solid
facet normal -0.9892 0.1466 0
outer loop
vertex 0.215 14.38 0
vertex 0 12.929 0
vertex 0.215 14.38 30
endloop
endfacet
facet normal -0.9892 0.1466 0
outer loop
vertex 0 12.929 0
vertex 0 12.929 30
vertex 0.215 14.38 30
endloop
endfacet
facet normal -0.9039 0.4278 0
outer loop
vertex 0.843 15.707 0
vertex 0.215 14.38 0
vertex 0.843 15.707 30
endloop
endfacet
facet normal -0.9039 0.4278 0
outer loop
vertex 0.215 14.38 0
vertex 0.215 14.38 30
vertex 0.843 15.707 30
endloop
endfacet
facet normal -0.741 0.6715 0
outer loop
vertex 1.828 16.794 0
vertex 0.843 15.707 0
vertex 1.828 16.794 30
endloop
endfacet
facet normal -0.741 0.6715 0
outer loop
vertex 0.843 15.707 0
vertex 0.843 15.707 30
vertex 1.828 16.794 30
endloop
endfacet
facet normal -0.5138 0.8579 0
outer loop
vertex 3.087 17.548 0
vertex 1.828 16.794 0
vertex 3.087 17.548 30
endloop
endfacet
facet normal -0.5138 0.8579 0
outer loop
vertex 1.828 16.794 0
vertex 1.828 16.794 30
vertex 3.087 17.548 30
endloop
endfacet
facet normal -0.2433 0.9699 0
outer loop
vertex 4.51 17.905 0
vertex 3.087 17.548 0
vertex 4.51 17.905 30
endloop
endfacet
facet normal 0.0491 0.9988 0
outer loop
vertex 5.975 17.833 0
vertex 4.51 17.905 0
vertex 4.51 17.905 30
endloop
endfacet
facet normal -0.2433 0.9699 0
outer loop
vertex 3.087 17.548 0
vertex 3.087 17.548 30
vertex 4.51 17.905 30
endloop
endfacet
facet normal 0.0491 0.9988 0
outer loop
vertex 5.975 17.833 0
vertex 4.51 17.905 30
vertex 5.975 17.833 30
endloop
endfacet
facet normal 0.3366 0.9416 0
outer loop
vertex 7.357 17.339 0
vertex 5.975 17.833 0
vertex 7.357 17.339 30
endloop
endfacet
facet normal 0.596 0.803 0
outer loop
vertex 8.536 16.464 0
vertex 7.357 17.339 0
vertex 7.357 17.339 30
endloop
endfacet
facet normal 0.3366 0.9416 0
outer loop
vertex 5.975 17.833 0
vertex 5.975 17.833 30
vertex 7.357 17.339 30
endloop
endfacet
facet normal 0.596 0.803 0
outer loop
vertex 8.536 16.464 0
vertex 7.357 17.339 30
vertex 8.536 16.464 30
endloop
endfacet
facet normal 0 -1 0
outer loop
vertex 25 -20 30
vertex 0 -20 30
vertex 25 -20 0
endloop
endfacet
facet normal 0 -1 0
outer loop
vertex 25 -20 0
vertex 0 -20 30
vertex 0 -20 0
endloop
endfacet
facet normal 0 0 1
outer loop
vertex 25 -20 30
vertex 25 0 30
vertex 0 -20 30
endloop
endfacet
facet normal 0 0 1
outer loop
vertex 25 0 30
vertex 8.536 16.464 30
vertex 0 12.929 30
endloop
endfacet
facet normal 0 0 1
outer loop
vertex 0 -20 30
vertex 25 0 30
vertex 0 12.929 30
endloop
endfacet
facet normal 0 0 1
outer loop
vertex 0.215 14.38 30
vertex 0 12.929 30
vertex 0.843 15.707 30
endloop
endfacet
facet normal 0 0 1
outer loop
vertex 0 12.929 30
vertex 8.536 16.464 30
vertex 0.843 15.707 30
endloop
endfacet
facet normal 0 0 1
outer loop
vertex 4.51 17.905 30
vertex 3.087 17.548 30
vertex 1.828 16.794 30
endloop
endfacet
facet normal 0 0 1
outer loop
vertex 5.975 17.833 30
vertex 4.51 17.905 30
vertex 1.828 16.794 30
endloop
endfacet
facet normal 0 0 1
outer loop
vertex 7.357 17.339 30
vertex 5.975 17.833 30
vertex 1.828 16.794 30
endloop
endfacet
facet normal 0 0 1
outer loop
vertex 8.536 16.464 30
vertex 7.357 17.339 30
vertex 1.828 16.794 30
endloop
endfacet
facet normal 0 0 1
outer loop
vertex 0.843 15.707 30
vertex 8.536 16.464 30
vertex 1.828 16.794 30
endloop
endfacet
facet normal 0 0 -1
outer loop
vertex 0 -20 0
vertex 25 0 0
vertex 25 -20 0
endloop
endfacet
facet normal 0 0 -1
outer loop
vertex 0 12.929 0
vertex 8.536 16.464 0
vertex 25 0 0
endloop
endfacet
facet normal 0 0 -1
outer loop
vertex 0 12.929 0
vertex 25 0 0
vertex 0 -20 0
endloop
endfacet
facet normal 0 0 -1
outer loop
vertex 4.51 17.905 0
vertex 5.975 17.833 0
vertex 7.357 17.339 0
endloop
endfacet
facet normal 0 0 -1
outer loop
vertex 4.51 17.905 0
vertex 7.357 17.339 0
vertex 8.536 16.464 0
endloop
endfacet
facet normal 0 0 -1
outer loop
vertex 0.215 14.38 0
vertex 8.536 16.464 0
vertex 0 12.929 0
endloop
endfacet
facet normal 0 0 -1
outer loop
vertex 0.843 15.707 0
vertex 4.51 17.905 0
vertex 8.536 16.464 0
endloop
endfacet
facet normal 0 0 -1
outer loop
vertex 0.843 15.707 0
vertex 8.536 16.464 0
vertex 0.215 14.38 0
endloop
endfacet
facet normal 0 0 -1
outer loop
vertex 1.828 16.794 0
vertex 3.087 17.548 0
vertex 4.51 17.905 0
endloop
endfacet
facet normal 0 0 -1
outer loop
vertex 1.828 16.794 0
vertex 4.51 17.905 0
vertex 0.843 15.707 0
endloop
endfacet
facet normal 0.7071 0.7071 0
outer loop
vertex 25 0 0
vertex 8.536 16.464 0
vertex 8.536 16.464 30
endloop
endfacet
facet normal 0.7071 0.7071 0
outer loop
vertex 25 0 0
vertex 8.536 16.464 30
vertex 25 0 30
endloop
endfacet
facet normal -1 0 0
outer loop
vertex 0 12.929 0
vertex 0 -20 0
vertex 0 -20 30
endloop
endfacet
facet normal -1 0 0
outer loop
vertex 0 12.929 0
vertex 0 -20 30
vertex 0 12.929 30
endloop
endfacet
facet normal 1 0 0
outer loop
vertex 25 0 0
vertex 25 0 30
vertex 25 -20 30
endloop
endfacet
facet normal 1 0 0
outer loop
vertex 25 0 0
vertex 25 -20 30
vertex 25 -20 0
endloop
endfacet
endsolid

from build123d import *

# Parameters (mm, degrees)
CROQUIS2_W              = 30
CROQUIS2_H              = 20
SALIENTE_EXTRUIR2_DEPTH = 25
SALIENTE_EXTRUIR3_DEPTH = 30
REDONDEO1_R             = 5


with BuildPart() as part:
    # Croquis2 → Saliente-Extruir2 (new body)
    with BuildSketch(Plane(origin=(0, 0, 0), x_dir=(0, 0, -1), z_dir=(1, 0, 0))):
        with Locations((-15, -10)):
            Rectangle(CROQUIS2_W, CROQUIS2_H)
    extrude(amount=SALIENTE_EXTRUIR2_DEPTH)

    # Croquis3 → Saliente-Extruir3 (add, through all)
    with BuildSketch(Plane(origin=(0, 0, 0), x_dir=(-1, 0, 0), z_dir=(0, 0, -1))):
        Polygon((0, 0), (0, 25), (-25, 0), align=None)
    extrude(amount=-SALIENTE_EXTRUIR3_DEPTH)

    # Redondeo1
    redondeo1_edges = [part.edges().sort_by_distance(p)[0] for p in [
        (0, 25, 15),
    ]]
    fillet(redondeo1_edges, radius=REDONDEO1_R)


solid = part.part
